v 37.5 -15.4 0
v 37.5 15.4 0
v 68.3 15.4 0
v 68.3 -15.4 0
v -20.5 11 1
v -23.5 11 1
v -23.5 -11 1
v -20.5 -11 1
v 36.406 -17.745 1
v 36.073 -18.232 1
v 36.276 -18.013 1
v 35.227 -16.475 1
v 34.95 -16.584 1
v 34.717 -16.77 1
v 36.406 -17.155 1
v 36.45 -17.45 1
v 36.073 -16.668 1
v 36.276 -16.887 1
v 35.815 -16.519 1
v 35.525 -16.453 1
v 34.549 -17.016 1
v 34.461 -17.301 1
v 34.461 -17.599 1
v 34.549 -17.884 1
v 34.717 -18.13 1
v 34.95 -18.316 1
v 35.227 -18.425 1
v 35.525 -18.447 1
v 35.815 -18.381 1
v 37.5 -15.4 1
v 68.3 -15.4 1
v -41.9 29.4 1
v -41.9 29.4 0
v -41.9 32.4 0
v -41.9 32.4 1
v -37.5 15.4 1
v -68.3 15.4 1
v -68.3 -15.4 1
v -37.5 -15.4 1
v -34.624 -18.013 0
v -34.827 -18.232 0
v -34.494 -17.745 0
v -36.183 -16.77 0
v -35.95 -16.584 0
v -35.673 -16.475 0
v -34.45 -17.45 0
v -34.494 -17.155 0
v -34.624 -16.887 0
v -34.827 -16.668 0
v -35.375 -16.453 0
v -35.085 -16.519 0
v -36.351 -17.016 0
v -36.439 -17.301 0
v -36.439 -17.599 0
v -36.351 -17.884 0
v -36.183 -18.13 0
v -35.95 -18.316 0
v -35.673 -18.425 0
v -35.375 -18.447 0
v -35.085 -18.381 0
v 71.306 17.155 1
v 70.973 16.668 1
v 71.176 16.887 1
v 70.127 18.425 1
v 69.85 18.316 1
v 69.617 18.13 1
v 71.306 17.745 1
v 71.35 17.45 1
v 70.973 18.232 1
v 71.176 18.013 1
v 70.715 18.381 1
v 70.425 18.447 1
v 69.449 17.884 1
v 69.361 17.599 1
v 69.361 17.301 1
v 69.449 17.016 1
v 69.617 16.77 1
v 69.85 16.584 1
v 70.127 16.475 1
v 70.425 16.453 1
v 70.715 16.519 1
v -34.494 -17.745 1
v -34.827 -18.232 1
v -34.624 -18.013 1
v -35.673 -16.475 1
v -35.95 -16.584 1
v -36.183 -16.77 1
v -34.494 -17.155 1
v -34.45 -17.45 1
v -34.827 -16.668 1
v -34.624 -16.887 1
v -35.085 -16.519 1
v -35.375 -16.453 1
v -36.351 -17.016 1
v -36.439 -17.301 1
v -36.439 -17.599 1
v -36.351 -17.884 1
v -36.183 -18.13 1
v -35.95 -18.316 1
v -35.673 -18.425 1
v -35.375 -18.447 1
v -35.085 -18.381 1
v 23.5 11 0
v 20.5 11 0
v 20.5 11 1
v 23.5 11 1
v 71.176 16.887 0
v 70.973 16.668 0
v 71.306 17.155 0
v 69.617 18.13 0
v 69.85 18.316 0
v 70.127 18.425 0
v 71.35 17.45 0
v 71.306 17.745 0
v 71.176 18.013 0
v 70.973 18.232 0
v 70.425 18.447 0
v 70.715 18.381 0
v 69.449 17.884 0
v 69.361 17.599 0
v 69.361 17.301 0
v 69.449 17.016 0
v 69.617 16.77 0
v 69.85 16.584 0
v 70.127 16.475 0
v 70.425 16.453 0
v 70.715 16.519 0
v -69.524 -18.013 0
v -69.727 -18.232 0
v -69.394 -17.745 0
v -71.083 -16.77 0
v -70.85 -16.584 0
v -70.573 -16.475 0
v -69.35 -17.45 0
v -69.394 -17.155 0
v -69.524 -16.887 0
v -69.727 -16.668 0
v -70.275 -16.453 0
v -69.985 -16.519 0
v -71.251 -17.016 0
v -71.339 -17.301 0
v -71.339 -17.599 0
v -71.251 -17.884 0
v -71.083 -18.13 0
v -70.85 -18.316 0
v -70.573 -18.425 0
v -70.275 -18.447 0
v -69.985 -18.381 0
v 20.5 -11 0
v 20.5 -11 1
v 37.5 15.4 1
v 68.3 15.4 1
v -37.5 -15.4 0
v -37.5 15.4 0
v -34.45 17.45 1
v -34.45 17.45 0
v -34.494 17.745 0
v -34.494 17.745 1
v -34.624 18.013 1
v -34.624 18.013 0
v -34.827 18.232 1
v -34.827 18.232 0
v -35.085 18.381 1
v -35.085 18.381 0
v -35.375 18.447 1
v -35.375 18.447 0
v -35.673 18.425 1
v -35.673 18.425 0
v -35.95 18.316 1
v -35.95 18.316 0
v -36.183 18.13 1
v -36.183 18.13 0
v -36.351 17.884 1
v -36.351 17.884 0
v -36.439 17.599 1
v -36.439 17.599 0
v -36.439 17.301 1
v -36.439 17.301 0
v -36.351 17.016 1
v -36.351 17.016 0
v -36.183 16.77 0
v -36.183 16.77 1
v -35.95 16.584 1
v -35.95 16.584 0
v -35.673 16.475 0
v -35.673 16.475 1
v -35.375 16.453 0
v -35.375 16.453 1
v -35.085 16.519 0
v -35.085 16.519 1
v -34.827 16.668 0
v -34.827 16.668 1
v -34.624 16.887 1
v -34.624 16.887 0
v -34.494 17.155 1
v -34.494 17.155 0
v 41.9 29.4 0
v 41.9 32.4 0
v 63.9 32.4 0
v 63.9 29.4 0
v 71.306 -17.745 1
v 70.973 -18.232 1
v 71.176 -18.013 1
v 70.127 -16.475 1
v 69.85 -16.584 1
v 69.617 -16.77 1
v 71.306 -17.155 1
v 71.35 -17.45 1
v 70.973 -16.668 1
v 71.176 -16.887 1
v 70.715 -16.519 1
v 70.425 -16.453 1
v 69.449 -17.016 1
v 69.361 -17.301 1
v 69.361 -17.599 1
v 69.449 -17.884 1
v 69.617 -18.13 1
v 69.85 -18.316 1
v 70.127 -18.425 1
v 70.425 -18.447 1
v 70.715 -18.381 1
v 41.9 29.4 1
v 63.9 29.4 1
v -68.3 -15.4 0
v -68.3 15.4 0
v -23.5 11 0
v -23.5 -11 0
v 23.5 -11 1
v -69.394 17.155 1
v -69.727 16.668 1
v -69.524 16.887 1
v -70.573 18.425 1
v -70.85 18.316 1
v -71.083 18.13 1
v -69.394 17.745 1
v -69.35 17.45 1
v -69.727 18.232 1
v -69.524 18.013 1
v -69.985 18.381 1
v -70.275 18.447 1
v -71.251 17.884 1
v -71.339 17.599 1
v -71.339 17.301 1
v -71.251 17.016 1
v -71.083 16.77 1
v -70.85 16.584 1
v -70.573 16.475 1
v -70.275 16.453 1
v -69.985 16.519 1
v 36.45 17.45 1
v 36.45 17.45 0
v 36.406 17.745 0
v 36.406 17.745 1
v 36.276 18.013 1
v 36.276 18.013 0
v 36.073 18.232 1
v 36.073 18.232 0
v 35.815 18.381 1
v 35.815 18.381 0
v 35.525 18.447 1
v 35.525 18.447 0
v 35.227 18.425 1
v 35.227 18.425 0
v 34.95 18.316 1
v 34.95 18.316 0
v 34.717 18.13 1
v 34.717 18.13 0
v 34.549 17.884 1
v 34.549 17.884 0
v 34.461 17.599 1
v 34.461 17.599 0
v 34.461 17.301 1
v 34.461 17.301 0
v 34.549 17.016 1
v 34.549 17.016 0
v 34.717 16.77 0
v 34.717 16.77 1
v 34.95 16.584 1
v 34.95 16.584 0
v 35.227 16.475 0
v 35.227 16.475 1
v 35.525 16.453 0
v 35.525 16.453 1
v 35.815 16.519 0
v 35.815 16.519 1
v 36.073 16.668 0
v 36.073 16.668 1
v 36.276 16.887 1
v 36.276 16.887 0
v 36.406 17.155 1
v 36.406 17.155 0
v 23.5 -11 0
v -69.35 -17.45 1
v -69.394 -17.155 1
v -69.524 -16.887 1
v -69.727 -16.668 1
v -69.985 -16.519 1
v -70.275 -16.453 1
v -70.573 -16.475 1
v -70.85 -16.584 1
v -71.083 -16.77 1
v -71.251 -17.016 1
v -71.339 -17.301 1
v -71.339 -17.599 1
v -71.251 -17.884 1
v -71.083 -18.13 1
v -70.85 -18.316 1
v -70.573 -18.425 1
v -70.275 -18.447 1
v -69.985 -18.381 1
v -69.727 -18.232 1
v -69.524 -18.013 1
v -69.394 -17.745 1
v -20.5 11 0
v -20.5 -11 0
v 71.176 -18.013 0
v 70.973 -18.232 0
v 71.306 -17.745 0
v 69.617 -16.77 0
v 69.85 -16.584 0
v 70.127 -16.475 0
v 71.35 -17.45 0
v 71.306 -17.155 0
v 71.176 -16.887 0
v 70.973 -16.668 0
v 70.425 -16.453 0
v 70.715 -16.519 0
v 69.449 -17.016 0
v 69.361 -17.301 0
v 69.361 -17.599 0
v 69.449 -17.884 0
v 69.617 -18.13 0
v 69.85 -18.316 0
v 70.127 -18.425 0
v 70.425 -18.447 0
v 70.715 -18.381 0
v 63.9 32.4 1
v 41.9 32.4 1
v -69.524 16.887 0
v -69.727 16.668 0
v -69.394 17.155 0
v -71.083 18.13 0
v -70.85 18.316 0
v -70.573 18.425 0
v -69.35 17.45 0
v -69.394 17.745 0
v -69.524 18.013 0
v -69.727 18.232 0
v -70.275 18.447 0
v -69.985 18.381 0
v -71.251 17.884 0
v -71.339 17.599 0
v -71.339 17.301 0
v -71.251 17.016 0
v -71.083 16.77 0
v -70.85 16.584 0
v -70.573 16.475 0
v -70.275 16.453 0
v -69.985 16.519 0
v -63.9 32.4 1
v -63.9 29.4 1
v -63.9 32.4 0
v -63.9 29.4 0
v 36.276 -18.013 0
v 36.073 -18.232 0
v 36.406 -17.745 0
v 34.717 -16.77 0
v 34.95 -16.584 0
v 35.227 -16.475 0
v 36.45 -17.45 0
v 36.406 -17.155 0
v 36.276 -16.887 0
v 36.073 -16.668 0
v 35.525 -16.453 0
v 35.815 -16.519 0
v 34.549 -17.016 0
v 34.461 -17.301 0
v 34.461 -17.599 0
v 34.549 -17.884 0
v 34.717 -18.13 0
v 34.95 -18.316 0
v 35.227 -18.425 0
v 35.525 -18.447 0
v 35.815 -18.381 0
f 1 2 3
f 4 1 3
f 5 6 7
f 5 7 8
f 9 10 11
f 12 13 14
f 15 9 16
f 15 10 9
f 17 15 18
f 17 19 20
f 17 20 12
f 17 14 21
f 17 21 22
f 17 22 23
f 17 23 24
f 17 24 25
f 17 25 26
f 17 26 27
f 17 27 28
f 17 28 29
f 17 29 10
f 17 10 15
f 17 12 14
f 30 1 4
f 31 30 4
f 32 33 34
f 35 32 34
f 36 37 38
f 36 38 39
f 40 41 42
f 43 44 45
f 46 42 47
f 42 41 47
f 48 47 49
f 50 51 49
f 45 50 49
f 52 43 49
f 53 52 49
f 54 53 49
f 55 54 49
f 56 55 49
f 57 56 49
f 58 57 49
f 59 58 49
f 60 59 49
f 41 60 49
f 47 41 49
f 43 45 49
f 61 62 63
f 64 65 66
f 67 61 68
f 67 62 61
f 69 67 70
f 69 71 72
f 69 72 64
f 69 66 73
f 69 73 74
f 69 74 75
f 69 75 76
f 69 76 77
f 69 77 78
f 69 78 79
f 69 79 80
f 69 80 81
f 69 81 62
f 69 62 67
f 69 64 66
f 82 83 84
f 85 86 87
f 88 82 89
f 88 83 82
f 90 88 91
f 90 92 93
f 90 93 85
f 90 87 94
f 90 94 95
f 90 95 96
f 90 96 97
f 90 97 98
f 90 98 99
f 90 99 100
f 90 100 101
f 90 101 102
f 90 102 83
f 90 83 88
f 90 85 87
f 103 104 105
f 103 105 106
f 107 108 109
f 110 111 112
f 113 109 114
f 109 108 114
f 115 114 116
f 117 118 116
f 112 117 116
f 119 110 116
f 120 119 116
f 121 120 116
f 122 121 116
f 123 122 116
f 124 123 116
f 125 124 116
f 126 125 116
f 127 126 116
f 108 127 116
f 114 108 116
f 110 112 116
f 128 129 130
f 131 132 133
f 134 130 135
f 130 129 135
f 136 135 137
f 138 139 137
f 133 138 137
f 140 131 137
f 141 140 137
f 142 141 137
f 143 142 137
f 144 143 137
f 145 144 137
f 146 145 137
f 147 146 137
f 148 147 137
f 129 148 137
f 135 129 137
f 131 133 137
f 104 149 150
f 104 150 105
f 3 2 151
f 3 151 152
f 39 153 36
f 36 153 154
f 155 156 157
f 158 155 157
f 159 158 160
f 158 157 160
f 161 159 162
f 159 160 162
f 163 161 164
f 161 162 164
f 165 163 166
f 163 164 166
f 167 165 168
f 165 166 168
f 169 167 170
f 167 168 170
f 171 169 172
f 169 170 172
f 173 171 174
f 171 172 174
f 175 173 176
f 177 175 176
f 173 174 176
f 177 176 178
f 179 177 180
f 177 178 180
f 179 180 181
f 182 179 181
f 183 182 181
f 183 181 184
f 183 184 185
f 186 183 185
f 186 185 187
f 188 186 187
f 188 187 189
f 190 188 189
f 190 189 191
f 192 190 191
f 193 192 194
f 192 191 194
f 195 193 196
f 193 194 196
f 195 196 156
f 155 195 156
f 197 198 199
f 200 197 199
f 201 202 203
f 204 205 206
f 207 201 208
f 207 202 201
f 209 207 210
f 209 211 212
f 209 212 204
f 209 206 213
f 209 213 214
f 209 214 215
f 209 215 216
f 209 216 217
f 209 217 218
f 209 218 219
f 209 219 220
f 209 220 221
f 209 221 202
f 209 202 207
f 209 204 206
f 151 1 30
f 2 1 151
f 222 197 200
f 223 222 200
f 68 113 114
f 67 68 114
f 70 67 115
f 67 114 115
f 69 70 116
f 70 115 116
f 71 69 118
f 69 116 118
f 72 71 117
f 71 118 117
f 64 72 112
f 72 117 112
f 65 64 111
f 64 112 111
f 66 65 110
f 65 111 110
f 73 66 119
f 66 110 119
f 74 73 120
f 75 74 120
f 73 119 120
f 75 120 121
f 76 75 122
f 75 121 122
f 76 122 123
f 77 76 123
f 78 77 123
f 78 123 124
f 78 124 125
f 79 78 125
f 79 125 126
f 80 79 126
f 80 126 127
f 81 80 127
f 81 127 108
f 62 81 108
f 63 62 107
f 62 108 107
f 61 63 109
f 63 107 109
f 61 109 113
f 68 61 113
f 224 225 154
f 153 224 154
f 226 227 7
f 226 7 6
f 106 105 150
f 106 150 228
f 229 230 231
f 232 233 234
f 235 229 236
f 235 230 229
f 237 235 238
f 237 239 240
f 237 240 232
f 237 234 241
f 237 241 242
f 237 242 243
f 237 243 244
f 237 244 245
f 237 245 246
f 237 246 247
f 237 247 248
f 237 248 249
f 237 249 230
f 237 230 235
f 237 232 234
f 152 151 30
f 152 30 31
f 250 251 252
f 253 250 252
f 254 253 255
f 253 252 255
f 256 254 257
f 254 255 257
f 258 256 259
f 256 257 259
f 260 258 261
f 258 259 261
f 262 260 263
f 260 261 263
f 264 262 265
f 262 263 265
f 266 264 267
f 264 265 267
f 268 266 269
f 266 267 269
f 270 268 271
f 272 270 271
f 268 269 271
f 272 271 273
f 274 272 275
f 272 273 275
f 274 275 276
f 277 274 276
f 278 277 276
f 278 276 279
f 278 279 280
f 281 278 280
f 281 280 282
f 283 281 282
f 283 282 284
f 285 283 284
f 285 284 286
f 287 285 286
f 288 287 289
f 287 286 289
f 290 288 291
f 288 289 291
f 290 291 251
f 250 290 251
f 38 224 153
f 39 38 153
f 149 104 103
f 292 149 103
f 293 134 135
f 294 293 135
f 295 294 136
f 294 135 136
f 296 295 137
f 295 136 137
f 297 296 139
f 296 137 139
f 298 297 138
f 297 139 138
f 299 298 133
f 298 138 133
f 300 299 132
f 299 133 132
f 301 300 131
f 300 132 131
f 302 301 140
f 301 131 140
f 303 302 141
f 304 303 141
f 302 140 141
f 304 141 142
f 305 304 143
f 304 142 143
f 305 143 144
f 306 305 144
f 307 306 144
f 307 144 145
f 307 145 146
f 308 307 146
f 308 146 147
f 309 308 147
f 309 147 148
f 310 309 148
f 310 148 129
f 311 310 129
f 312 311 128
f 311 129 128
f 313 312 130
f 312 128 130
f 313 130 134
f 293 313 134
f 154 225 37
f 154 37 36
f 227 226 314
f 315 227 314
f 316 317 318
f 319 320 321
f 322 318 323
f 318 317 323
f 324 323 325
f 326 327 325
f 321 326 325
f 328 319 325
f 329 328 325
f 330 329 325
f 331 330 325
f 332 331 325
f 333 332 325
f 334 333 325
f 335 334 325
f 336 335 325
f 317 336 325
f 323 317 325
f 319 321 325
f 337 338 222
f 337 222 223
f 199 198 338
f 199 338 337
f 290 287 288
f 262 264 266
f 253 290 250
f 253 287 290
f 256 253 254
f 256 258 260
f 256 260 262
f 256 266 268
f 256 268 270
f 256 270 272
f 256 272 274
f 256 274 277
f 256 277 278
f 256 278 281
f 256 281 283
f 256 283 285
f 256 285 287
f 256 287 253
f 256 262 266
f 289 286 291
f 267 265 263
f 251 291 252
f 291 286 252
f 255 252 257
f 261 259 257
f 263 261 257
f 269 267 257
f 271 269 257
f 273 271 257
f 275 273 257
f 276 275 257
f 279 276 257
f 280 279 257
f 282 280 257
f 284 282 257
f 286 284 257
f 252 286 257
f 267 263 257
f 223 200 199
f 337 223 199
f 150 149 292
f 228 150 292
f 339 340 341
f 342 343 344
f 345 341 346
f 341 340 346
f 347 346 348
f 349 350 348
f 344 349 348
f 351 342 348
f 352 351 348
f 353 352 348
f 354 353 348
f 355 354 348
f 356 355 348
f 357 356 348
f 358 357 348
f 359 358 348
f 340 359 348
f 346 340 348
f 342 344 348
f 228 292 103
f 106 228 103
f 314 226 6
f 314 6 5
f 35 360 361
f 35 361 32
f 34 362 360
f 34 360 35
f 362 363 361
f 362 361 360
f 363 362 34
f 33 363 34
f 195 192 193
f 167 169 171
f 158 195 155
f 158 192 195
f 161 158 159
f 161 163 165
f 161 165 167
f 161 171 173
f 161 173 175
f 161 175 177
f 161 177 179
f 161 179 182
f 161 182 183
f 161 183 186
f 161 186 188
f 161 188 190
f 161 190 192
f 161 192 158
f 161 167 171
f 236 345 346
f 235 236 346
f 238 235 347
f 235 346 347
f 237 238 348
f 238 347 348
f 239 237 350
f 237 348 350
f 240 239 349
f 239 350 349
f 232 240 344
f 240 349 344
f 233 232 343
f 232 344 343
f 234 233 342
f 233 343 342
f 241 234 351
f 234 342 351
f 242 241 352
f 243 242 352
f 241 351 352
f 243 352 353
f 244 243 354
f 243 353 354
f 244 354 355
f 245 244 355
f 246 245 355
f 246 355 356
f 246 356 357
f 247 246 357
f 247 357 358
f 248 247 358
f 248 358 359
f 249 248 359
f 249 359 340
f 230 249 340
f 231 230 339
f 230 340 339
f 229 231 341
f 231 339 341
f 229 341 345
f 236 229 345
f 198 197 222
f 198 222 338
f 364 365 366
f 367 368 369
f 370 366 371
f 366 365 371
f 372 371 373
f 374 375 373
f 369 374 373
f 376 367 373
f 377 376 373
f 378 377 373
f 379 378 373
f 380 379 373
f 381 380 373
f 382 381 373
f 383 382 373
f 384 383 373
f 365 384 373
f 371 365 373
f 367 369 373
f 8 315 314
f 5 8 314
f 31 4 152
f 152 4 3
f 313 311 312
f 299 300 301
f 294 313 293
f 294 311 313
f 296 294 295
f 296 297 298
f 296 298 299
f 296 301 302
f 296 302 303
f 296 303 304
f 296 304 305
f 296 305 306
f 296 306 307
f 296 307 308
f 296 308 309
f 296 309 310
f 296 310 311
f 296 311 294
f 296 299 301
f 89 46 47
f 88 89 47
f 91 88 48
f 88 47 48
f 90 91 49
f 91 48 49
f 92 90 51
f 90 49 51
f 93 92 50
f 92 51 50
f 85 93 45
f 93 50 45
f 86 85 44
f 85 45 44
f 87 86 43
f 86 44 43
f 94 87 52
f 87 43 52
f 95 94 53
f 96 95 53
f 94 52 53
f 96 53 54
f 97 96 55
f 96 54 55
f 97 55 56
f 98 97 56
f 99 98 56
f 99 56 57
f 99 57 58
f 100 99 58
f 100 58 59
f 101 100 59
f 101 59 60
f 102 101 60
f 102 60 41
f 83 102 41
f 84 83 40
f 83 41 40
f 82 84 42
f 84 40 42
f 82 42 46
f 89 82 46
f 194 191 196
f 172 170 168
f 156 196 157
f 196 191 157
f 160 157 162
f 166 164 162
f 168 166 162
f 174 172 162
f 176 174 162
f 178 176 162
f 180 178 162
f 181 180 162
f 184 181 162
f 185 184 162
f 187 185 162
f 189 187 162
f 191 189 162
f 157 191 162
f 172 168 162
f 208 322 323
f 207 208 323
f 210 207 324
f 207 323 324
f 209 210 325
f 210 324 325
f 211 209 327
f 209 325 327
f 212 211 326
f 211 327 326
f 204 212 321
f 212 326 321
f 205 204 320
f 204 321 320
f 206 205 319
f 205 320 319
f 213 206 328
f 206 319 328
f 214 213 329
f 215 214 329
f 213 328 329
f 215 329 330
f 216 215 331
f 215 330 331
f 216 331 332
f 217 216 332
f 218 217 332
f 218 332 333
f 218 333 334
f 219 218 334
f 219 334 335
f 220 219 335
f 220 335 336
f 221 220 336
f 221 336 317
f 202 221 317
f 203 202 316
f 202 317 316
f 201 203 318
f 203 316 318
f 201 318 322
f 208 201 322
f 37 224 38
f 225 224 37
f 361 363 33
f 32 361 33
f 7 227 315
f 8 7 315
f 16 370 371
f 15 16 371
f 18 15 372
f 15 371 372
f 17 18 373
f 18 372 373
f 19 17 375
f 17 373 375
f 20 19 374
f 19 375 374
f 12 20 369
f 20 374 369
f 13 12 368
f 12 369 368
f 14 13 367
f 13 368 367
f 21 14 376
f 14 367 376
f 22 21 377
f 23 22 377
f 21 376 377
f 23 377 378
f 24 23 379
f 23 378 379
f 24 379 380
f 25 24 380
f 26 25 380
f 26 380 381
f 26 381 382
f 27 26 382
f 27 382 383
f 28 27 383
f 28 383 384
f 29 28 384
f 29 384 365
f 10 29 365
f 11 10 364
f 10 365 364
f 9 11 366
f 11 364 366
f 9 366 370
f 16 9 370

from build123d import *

# Parameters (mm, degrees)
F0_W     = 3
F0_H     = 22
F0_W_2   = 22
F0_H_2   = 3
F0_W_3   = 30.8
F0_H_3   = 30.8
F0_R     = 1
F1_DEPTH = 1


with BuildPart() as f1:
    # F0 (on Top) → F1 (new body)
    with BuildSketch(Plane.XY):
        with Locations((22, 0)):
            Rectangle(F0_W, F0_H)
        with Locations((52.9, 30.9)):
            Rectangle(F0_W_2, F0_H_2)
        with Locations((-52.9, 30.9)):
            Rectangle(F0_W_2, F0_H_2)
        with Locations((-22, 0)):
            Rectangle(F0_W, F0_H)
        with Locations((-52.9, 0)):
            Rectangle(F0_W_3, F0_H_3)
        with Locations((52.9, 0)):
            Rectangle(F0_W_3, F0_H_3)
        with Locations((35.45, -17.45)):
            Circle(F0_R)
        with Locations((35.45, 17.45)):
            Circle(F0_R)
        with Locations((-70.35, -17.45)):
            Circle(F0_R)
        with Locations((-70.35, 17.45)):
            Circle(F0_R)
        with Locations((70.35, 17.45)):
            Circle(F0_R)
        with Locations((70.35, -17.45)):
            Circle(F0_R)
        with Locations((-35.45, -17.45)):
            Circle(F0_R)
        with Locations((-35.45, 17.45)):
            Circle(F0_R)
    extrude(amount=F1_DEPTH)


solid = f1.part
